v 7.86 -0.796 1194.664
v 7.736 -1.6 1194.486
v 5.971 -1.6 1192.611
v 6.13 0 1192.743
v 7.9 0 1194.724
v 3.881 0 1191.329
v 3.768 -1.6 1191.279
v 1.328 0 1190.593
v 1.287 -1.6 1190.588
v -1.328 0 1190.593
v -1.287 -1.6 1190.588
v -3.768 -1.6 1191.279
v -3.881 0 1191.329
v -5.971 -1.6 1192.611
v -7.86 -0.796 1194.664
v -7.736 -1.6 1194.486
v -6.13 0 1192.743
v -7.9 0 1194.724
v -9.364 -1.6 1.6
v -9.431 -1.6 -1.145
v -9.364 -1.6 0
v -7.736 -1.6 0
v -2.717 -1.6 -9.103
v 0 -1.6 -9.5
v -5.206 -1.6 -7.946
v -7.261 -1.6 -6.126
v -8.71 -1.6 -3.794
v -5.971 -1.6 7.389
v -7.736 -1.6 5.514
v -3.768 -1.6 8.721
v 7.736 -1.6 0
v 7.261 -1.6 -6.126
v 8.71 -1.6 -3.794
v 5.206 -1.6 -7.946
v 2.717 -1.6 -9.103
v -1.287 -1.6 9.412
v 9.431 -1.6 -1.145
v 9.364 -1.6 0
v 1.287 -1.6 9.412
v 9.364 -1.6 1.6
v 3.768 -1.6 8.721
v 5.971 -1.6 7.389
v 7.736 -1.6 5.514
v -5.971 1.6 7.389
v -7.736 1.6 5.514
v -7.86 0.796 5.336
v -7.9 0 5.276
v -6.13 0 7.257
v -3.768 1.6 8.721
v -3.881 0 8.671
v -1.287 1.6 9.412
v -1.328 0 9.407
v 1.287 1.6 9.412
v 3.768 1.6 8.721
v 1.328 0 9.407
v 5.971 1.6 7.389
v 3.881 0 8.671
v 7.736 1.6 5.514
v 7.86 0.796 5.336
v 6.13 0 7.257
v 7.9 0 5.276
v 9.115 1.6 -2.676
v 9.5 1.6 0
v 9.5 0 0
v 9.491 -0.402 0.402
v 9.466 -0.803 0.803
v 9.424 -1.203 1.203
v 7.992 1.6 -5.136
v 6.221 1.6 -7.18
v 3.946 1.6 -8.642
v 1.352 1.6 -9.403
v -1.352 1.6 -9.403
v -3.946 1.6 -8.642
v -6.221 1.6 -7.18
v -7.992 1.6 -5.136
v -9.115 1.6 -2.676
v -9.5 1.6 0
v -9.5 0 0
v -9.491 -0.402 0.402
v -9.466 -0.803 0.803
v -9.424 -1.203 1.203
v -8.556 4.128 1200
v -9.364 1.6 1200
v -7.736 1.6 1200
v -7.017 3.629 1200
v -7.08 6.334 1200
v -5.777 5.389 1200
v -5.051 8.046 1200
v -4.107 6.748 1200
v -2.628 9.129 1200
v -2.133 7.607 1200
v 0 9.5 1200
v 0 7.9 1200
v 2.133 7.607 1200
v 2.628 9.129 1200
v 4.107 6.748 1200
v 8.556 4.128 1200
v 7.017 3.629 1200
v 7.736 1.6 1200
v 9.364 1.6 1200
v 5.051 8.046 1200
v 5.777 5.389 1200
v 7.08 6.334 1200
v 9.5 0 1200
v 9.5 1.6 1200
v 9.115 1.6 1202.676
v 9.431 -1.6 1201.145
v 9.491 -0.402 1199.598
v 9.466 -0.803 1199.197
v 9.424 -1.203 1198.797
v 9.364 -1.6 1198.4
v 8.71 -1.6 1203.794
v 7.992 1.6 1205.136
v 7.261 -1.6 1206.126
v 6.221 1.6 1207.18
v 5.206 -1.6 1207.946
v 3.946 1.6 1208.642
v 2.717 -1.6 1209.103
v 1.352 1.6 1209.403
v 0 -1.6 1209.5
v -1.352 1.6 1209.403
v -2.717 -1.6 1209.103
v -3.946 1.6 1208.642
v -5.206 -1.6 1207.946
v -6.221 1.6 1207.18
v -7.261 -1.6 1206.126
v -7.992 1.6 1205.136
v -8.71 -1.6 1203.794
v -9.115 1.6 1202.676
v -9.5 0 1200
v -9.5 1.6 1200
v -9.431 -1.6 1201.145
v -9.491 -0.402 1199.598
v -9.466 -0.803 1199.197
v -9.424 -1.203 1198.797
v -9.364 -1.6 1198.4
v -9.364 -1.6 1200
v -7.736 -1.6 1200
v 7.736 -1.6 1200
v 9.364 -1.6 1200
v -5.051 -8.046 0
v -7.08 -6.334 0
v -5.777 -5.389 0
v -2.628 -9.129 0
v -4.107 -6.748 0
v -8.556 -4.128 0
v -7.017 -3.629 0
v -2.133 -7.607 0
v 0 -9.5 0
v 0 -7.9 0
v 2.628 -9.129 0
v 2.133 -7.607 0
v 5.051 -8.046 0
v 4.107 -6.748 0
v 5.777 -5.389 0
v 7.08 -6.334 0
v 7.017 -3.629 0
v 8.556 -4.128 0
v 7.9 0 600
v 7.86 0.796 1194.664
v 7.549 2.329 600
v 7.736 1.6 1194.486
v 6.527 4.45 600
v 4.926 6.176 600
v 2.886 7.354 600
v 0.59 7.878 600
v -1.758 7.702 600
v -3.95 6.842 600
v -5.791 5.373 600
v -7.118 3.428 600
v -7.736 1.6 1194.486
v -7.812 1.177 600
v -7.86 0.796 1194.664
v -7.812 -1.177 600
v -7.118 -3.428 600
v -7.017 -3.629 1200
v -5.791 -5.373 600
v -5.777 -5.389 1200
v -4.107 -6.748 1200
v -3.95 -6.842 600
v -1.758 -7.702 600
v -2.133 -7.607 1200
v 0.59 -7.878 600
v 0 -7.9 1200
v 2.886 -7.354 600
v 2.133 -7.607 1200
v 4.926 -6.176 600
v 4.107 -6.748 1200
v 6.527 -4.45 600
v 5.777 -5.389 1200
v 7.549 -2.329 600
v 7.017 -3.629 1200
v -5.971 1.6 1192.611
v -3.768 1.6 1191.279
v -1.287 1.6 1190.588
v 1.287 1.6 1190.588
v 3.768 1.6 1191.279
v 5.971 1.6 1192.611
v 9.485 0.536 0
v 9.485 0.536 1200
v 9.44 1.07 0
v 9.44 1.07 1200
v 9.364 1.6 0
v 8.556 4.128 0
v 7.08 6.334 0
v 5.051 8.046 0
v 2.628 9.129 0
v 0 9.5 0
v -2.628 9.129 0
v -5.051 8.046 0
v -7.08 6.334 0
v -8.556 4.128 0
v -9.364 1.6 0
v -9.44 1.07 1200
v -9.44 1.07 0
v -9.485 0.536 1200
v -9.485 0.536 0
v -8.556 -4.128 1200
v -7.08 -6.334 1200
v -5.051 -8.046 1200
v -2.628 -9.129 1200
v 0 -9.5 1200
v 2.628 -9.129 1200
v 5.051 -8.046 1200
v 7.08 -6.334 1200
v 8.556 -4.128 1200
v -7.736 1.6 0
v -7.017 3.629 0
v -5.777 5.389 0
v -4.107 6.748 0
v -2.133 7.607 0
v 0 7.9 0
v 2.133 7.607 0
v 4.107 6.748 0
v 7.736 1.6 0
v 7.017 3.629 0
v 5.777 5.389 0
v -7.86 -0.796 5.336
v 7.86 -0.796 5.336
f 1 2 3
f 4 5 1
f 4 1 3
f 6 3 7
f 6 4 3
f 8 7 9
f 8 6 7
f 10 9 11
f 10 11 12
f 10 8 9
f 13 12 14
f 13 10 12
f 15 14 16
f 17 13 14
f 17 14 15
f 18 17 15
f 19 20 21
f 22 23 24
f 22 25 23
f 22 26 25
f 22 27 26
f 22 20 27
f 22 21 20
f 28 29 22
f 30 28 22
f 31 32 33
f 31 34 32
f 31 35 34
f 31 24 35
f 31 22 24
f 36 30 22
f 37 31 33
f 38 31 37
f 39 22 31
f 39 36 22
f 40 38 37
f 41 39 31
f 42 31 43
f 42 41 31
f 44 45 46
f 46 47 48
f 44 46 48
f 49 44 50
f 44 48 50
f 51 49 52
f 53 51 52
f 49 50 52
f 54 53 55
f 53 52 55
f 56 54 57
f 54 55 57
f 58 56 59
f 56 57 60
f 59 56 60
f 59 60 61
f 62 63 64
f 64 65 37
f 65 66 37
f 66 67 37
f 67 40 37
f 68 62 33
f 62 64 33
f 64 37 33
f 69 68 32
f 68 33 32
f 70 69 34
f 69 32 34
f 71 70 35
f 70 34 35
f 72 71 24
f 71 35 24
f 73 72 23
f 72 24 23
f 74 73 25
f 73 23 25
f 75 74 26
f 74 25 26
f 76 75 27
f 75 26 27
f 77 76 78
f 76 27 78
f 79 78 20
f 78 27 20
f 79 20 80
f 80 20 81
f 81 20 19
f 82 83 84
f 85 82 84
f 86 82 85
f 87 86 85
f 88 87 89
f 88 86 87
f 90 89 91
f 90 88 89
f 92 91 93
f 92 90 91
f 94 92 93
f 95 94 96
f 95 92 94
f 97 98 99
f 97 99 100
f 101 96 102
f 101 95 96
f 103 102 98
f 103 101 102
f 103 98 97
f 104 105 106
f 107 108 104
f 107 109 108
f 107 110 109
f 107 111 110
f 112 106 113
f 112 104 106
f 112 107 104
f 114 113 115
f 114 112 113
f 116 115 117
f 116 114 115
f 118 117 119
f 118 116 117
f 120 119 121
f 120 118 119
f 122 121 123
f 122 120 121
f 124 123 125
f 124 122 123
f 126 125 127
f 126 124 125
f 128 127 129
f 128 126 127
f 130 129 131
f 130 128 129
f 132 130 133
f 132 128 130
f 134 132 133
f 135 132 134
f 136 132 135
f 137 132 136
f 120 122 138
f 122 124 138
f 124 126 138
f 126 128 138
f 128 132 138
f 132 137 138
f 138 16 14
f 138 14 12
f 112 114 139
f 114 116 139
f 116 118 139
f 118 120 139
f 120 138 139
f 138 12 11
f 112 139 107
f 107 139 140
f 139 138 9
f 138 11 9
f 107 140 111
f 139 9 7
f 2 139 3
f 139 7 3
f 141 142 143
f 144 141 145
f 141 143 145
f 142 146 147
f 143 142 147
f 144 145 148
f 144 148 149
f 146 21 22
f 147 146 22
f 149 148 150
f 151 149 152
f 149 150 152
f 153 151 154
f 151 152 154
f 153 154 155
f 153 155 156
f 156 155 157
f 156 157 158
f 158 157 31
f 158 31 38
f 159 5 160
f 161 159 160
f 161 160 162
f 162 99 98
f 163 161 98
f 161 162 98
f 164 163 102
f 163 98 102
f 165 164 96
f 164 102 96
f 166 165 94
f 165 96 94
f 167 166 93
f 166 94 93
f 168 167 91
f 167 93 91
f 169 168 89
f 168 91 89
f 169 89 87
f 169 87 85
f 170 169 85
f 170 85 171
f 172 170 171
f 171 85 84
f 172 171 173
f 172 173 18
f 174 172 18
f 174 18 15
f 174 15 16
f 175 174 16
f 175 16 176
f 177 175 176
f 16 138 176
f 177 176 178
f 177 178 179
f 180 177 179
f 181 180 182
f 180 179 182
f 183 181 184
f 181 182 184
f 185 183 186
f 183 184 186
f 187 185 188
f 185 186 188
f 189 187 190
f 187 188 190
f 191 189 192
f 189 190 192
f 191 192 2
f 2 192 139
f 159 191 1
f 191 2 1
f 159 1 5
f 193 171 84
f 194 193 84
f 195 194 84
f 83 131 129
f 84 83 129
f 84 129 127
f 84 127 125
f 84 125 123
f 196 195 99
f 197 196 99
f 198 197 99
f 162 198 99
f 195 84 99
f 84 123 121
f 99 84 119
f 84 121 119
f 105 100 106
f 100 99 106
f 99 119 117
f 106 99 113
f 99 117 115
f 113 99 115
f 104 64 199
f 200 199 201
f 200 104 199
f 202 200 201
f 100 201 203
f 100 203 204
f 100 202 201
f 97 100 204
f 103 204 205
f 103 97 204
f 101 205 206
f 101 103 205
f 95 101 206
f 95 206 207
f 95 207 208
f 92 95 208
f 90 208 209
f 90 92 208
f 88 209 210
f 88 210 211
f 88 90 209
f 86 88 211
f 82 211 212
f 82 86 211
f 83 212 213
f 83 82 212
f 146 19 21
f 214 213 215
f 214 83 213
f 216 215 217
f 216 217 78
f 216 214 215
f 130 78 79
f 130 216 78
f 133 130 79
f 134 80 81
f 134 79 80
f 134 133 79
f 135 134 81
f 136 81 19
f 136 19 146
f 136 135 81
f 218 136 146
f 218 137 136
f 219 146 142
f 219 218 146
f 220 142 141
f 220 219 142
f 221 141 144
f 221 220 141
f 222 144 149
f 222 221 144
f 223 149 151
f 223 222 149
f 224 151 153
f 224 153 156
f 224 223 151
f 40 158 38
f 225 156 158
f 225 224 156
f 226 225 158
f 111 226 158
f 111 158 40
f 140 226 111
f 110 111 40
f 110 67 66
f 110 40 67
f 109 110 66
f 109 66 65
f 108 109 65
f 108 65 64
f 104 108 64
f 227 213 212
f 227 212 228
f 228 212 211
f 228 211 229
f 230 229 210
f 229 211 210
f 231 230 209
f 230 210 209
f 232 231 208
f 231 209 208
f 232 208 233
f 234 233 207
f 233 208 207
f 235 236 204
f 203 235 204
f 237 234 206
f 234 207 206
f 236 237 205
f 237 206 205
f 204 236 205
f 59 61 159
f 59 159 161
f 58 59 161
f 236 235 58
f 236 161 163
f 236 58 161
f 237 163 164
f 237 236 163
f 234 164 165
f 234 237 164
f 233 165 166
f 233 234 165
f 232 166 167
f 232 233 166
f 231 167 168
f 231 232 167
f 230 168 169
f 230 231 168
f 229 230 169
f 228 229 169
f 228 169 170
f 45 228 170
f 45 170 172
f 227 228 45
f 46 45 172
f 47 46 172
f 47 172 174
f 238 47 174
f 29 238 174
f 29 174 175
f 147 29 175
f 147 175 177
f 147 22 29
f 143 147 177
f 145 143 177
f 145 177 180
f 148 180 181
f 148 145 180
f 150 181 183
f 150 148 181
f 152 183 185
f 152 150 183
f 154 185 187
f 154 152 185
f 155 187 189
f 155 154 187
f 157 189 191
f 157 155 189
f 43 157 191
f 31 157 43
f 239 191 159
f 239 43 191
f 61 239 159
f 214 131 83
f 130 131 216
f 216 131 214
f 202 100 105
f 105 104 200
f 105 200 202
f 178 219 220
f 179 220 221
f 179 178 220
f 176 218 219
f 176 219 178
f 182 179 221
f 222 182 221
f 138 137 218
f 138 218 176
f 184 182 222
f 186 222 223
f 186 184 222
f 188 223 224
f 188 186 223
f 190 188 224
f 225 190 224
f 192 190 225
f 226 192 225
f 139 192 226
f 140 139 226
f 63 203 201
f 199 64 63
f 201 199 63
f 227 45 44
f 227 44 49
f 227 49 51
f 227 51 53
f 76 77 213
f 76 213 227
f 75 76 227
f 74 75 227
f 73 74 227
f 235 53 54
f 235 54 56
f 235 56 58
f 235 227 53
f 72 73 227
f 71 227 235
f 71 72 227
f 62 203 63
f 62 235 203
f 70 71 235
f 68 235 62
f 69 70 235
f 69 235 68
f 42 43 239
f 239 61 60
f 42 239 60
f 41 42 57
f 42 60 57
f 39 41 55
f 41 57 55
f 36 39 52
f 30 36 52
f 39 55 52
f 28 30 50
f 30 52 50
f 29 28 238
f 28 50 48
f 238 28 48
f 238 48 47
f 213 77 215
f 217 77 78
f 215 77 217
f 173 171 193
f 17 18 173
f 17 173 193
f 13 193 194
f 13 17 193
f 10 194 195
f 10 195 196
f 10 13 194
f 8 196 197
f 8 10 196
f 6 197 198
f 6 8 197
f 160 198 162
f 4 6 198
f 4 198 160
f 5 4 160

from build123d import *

# Parameters (mm, degrees)
F0_R     = 9.5
F0_R_2   = 7.9
F1_DEPTH = 600
F2_R     = 9.5
F3_DEPTH = 1.6
F4_DEPTH = 1.6


with BuildPart() as f1:
    # F0 (on Top) → F1 (new body)
    with BuildSketch(Plane.XY):
        Circle(F0_R)
        Circle(F0_R_2, mode=Mode.SUBTRACT)
    extrude(amount=F1_DEPTH)

    # F2 (on Front) → F3 (join)
    with BuildSketch(Plane.XZ):
        Circle(F2_R)
    extrude(amount=F3_DEPTH)

    # F3_face (on face) → F4 (join)
    with BuildSketch(Plane(origin=(0, 0, -0.084371), x_dir=(1, 0, 0), z_dir=(0, 1, 0))):
        with BuildLine():
            ThreePointArc((9.5, -0.084371), (0, 9.415629), (-9.5, -0.084371))
            Line((-9.5, -0.084371), (-7.9, -0.084371))
            Line((-7.9, -0.084371), (-7.9, -5.360733))
            ThreePointArc((-7.9, -5.360733), (0, -9.584371), (7.9, -5.360733))
            Line((7.9, -5.360733), (7.9, -0.084371))
            Line((7.9, -0.084371), (9.5, -0.084371))
        make_face()
    extrude(amount=F4_DEPTH)

    # F5: F1 across face


with BuildPart() as f1_1:
    add(f1.part)
    add(f1.part.mirror(Plane.XY.offset(600)))


solid = f1_1.part
